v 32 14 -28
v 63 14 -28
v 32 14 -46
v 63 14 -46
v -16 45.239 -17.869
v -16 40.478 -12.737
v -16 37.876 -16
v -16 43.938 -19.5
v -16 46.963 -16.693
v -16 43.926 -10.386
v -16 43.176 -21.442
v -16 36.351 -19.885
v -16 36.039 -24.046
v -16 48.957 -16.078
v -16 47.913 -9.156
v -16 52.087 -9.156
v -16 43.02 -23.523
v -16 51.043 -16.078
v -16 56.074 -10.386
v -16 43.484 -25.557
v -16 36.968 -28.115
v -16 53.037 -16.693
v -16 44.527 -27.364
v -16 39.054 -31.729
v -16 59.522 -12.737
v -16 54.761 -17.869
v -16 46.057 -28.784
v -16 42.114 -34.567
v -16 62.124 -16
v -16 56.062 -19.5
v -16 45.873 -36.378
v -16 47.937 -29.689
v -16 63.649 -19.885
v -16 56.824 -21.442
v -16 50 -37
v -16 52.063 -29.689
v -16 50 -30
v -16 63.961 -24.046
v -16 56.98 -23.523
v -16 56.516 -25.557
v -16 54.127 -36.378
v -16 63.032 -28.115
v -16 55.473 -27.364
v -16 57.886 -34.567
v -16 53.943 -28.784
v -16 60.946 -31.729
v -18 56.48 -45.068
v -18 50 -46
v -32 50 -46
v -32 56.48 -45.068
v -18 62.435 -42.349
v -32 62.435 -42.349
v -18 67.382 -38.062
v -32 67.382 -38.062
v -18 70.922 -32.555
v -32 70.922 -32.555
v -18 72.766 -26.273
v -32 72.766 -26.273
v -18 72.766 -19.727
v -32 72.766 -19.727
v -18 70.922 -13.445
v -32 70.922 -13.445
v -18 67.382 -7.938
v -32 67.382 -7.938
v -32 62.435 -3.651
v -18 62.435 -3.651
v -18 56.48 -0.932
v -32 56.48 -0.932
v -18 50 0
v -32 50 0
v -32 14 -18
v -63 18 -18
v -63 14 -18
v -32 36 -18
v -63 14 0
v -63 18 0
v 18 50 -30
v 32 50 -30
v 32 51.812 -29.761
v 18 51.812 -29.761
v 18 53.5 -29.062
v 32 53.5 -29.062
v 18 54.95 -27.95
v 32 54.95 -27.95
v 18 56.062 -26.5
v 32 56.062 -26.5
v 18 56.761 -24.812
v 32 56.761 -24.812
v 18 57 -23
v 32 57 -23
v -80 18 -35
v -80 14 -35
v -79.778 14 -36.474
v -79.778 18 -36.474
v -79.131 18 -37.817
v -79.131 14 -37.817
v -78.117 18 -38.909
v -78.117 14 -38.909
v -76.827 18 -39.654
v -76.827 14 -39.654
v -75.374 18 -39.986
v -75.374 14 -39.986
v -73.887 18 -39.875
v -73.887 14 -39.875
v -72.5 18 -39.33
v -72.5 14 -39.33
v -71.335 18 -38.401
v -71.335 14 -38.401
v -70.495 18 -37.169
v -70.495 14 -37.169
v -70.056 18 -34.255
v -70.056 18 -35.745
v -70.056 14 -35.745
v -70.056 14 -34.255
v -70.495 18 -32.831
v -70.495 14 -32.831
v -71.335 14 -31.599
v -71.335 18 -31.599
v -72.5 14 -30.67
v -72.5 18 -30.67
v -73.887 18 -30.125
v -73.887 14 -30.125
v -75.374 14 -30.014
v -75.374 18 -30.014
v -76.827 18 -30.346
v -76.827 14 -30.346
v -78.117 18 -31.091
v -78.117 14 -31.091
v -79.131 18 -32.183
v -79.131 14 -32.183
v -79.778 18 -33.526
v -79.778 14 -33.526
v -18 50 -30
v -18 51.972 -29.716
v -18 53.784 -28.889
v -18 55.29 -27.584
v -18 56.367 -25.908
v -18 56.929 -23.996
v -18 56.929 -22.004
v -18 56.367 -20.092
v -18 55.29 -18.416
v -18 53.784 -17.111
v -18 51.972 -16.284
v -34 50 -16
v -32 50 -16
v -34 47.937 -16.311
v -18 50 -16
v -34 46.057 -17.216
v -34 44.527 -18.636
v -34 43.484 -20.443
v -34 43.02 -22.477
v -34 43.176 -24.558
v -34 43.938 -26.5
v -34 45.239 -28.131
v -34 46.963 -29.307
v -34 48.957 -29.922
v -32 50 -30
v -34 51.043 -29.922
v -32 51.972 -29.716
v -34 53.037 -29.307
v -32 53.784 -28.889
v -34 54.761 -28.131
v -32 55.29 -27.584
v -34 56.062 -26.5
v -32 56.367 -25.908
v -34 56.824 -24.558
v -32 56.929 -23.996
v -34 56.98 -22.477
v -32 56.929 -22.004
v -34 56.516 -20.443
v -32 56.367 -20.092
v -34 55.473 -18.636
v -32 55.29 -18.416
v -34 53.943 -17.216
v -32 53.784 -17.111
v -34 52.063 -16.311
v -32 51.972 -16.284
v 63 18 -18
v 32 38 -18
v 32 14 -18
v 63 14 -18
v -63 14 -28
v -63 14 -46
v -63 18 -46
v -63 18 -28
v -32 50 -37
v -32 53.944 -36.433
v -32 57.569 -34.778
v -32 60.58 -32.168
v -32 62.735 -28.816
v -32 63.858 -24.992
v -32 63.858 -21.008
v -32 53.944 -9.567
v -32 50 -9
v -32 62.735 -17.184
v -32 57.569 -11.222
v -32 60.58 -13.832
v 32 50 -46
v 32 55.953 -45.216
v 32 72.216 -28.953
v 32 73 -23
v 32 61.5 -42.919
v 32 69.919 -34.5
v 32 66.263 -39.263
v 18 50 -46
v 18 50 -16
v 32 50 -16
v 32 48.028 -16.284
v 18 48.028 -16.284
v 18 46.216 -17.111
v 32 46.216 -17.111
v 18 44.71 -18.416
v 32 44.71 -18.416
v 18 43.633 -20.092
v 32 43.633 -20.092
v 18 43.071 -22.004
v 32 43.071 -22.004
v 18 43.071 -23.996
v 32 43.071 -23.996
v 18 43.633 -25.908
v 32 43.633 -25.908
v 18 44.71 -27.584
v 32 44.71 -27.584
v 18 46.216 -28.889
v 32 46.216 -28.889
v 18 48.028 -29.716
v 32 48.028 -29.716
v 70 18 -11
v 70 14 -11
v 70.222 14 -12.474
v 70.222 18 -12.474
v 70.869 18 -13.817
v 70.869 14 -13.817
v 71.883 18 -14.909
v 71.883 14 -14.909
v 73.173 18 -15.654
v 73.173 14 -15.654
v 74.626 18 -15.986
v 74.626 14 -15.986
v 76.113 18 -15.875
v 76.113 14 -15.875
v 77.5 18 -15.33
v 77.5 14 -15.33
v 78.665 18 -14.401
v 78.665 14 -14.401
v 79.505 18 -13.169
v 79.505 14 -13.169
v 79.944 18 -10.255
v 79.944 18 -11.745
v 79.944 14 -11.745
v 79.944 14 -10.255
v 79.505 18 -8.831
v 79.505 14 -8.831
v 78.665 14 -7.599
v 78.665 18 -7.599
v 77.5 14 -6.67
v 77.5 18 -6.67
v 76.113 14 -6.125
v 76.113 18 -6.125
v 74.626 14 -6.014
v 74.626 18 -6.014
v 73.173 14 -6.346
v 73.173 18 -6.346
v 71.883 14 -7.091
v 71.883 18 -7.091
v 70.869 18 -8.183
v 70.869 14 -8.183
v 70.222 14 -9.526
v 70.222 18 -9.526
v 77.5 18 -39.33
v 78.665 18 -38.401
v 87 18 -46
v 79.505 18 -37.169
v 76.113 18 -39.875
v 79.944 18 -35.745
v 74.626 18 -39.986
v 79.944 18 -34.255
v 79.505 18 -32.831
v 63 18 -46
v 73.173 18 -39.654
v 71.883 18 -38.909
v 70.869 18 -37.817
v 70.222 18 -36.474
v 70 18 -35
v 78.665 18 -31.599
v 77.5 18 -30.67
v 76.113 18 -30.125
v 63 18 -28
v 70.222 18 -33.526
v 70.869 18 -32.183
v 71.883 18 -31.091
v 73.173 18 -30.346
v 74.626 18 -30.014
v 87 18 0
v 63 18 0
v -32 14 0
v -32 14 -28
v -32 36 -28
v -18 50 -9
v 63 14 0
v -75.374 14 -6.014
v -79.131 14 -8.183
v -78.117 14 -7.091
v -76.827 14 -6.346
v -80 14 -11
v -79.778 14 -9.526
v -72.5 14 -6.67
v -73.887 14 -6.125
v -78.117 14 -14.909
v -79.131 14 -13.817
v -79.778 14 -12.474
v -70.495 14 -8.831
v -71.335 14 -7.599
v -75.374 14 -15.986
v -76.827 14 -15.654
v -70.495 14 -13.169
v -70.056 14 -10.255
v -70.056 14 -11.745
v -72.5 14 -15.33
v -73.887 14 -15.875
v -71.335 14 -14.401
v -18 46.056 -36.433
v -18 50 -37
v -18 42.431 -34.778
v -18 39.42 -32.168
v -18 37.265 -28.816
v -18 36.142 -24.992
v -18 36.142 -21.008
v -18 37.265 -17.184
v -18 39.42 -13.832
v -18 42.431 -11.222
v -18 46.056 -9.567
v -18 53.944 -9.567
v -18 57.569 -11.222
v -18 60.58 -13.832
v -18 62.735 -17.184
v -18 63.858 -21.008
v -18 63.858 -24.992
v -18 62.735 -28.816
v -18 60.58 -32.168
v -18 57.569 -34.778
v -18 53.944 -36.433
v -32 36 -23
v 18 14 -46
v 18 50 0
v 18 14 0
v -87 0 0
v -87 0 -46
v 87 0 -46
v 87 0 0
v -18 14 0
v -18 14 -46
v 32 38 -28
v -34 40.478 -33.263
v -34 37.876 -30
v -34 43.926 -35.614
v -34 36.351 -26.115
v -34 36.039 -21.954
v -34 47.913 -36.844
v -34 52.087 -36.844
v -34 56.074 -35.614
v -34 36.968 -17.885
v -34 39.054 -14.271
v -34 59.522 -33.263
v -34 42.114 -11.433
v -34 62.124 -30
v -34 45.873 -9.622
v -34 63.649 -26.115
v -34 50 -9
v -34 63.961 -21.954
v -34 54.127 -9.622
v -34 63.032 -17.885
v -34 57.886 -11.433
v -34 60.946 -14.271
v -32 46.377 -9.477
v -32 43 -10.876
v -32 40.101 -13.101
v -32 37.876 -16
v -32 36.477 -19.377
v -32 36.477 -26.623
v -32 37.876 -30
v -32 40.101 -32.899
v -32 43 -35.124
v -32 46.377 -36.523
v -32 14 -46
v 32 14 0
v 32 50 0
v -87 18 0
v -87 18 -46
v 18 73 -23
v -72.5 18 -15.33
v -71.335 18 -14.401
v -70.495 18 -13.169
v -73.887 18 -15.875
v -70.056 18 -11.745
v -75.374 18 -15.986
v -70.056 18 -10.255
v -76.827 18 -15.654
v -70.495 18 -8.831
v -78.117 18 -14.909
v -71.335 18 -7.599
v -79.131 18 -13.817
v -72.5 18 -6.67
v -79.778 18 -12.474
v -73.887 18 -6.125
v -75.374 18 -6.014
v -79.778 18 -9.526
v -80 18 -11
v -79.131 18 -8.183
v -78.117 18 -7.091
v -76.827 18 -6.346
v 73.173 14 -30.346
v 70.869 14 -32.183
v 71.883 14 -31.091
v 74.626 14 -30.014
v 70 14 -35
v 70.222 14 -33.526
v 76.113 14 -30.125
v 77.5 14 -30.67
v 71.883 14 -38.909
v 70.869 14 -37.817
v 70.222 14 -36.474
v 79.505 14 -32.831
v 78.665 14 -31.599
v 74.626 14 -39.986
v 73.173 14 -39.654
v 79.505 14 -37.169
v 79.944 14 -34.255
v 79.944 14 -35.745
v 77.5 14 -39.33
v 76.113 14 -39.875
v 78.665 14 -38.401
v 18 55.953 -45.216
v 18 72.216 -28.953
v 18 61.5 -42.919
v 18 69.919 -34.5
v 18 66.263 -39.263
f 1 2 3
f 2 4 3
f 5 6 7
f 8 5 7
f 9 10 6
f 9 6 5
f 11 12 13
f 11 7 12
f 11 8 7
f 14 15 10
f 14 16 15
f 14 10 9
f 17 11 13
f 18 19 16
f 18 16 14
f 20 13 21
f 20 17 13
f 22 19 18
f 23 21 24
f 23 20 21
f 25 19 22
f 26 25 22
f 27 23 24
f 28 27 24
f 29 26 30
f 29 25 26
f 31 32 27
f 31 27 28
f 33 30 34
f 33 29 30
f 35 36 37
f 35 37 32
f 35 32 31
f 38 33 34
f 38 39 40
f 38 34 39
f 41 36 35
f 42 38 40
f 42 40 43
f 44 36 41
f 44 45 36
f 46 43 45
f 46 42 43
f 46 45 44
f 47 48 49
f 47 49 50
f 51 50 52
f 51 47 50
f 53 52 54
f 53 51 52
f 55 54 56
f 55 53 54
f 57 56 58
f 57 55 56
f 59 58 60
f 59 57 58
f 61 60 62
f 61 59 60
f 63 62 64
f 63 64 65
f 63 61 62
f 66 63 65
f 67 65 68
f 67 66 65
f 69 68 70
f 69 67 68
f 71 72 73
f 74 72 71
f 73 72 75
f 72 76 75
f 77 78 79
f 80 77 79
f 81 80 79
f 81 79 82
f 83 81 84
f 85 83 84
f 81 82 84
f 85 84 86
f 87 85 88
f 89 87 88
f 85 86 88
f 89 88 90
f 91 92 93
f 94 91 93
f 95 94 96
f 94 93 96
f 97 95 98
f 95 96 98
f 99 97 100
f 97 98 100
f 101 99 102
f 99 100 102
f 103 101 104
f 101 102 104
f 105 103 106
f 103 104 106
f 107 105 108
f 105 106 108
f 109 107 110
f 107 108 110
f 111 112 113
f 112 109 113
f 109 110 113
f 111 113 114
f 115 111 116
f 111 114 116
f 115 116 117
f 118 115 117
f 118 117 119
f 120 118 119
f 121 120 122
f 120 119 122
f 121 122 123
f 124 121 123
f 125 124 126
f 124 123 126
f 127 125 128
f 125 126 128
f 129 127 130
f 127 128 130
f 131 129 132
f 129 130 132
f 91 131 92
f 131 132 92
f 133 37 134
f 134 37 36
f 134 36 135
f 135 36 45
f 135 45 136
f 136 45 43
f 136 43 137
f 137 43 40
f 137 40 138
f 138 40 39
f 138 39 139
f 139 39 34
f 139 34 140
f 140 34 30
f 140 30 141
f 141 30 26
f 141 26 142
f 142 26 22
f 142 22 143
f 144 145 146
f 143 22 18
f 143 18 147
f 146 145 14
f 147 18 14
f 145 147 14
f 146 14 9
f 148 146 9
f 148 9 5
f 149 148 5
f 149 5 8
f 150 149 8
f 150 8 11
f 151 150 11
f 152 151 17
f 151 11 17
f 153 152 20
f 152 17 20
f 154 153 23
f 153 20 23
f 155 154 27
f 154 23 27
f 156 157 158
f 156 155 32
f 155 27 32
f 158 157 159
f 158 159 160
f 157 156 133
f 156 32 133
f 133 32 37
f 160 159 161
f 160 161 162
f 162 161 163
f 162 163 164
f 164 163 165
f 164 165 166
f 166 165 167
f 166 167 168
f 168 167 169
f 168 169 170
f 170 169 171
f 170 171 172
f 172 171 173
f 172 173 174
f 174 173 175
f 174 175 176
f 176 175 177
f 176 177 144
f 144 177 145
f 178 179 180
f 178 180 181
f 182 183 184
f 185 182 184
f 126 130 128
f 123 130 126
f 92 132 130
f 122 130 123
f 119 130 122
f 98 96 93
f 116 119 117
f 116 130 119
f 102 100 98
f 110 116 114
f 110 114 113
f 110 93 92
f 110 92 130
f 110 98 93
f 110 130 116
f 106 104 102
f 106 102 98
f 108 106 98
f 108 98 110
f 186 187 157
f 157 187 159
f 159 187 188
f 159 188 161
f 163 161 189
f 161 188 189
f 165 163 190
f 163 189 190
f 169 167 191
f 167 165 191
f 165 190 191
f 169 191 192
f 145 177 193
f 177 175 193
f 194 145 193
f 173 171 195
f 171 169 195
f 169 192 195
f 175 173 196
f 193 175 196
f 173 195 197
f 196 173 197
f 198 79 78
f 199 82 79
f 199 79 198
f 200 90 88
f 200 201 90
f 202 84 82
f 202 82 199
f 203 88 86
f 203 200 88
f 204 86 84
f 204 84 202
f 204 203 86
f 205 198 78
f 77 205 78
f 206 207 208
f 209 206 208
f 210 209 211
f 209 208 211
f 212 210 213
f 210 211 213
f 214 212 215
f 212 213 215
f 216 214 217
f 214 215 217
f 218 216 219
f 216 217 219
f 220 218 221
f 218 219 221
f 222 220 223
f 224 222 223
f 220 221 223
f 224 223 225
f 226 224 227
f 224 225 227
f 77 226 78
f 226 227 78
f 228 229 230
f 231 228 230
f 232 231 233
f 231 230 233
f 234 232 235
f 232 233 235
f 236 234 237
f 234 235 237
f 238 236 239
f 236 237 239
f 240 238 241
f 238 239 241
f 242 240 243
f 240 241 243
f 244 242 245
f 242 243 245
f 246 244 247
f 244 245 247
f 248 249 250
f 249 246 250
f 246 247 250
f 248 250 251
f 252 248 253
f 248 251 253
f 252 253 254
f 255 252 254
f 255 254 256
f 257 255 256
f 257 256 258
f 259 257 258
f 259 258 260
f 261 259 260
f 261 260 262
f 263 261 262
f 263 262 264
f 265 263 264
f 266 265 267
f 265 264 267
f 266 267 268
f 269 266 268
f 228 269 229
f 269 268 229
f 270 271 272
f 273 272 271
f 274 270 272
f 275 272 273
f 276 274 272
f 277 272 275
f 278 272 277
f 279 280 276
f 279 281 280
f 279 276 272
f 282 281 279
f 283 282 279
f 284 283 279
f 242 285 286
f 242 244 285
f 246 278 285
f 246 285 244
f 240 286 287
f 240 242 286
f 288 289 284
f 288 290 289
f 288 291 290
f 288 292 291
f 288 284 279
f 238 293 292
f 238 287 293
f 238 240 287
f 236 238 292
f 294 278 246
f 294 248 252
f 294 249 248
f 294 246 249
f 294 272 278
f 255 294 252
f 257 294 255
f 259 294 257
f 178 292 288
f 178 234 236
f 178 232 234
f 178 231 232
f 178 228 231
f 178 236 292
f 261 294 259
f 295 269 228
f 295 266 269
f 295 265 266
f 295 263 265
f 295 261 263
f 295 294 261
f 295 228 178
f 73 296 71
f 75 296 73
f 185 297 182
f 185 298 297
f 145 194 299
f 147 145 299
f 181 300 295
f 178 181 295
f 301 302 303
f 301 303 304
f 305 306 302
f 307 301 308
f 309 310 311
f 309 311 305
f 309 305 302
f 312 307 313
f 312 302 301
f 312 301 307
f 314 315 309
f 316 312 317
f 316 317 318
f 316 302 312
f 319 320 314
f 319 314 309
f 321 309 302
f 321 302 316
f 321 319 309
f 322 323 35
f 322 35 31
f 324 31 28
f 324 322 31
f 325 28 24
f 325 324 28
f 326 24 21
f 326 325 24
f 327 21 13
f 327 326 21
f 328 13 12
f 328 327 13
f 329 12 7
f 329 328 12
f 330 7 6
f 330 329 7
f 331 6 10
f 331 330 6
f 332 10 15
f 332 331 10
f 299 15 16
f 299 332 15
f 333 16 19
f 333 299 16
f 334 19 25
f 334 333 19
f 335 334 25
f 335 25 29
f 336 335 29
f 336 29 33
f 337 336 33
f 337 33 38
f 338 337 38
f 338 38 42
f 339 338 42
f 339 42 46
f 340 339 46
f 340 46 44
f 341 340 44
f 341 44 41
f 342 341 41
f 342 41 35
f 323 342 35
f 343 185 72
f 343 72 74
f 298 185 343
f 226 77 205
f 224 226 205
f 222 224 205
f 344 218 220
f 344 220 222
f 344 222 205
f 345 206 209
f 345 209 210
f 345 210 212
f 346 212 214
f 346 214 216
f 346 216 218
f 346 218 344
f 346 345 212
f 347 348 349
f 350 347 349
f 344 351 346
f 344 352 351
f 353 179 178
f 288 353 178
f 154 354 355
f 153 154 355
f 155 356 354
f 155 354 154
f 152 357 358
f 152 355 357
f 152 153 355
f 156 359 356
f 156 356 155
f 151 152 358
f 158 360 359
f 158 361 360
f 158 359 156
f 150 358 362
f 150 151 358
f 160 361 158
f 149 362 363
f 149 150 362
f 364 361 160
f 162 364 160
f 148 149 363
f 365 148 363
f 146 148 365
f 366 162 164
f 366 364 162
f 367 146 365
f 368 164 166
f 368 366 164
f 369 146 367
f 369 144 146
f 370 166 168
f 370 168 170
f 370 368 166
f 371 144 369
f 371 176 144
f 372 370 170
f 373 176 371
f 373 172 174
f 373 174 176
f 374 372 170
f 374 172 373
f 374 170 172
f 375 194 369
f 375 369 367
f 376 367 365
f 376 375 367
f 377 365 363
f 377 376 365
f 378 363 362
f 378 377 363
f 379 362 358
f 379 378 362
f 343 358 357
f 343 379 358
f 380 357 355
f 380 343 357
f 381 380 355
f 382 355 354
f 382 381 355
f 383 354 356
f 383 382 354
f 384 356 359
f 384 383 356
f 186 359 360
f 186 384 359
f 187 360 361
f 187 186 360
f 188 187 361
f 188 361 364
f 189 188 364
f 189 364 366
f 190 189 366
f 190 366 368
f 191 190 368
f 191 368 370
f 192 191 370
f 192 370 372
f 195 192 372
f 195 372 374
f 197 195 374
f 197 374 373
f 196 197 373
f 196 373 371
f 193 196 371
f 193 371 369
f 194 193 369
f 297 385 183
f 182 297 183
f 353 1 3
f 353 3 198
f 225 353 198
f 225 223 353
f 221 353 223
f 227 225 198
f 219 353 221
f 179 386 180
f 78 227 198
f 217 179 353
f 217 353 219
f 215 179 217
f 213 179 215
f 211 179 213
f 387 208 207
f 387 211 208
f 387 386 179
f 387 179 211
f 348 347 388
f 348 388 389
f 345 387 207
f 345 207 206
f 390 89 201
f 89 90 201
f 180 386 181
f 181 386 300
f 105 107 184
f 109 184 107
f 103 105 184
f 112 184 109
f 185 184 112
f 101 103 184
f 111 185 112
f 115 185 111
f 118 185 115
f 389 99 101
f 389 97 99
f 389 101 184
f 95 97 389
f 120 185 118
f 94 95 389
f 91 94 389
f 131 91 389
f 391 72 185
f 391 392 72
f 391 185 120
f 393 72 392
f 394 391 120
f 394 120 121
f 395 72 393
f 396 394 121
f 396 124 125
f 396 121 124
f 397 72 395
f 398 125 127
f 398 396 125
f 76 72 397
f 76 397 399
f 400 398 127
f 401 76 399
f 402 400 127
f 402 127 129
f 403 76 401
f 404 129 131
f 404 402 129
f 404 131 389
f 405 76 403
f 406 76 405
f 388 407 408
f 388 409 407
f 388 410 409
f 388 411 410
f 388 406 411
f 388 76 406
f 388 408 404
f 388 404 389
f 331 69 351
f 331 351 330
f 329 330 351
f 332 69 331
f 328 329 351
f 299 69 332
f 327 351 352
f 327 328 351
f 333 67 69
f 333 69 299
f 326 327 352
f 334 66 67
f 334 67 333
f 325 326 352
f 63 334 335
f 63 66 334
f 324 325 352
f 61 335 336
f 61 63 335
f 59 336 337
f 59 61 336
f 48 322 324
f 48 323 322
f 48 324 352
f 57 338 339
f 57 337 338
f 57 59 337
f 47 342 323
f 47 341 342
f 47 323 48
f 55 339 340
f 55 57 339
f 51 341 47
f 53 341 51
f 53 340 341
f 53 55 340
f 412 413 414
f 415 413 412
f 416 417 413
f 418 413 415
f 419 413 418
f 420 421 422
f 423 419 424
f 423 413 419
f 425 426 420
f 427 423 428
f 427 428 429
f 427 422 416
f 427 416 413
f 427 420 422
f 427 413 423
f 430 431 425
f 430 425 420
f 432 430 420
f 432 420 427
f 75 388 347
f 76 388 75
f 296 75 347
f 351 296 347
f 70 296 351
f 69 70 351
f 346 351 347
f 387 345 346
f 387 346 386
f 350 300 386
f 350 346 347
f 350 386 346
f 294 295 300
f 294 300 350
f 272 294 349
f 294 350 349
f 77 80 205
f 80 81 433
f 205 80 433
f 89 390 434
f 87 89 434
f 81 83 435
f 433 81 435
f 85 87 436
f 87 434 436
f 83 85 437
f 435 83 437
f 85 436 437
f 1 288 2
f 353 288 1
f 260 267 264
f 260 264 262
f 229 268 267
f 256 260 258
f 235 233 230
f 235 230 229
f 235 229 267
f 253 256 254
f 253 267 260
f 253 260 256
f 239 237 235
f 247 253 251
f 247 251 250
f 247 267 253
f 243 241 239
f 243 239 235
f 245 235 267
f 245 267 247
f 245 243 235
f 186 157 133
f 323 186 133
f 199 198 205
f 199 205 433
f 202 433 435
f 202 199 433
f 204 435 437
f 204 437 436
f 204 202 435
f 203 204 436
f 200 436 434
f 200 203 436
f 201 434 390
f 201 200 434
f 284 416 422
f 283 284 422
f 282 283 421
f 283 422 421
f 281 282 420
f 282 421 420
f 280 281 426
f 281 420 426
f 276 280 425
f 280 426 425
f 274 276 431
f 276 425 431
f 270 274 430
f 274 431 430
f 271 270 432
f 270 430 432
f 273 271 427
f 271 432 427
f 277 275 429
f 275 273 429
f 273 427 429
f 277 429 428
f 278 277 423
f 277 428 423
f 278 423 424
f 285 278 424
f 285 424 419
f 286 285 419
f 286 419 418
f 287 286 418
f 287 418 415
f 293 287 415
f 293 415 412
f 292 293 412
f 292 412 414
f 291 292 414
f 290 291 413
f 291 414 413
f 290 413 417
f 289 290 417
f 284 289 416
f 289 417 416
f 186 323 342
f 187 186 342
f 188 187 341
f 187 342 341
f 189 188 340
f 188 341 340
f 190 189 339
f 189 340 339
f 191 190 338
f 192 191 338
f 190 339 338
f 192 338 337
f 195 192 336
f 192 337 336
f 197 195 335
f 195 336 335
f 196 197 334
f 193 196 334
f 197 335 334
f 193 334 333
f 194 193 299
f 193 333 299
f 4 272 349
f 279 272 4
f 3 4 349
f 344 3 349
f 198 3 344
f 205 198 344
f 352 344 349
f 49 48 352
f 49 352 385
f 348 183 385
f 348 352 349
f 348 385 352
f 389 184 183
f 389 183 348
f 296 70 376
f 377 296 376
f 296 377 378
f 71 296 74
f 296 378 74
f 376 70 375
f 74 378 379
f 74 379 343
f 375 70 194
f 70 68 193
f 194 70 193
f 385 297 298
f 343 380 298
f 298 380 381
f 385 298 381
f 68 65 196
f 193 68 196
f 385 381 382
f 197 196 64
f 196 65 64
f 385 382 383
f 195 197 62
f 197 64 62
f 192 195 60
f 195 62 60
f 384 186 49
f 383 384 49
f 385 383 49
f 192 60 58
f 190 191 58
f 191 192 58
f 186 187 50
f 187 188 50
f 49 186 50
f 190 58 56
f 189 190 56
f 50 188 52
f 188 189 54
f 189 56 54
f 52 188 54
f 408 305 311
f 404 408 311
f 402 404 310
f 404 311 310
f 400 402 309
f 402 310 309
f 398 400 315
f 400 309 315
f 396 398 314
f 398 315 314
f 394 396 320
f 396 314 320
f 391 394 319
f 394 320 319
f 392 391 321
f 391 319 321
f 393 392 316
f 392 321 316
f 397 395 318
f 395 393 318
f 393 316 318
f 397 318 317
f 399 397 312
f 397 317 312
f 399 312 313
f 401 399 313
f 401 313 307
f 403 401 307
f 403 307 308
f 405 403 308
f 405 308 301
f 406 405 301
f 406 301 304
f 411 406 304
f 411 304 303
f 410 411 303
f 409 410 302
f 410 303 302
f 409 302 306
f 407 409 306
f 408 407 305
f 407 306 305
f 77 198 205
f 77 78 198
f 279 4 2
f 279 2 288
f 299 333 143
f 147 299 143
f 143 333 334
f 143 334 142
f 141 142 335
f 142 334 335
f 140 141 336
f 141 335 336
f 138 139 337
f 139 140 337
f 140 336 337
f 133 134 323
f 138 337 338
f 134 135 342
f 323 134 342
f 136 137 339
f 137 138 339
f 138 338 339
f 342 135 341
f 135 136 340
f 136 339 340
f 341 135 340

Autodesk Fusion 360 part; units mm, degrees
sketch "Sketch1" plane through (0, 0, 0) normal (0, 1, 0) x (1, 0, 0)
  line L0 (0, 0) -> (87, 0)
  line L1 (0, 0) -> (-87, 0)
  line L2 (-87, 0) -> (-87, 46)
  line L3 (87, 0) -> (87, 46)
  line L4 (-87, 46) -> (87, 46)
  dimension "d1" = 87
  dimension "d2" = 87
  dimension "d3" = 46
  dimension "d4" = 46
extrude "Extrude1" add sketch "Sketch1" along normal blind 14 makes body 1
sketch "Sketch2" plane through (0, 14, 0) normal (0, 1, 0) x (-1, 0, 0)
  line L0 (87, 0) -> (-87, 0)
  line L1 (-87, 0) -> (-87, -46)
  line L2 (-87, -46) -> (87, -46)
  line L3 (87, -46) -> (87, 0)
  line L4 (87, -46) -> (-87, -46)
  line L5 (-87, -46) -> (-87, 0)
  line L6 (-87, 0) -> (87, 0)
  line L7 (87, 0) -> (87, -46)
  line L8 (-87, -46) -> (-63, -46)
  line L9 (-63, -46) -> (-63, 0)
  line L10 (-63, 0) -> (-87, 0)
  line L11 (-87, 0) -> (-87, -46)
  line L12 (87, -46) -> (63, -46)
  line L13 (63, -46) -> (63, 0)
  line L14 (63, 0) -> (87, 0)
  line L15 (87, 0) -> (87, -46)
  line L16 (87, -46) -> (87, -23) construction
  line L17 (87, -23) -> (-87, -23) construction
  line L18 (87, -23) -> (87, -11) construction
  line L19 (87, -23) -> (87, -35) construction
  line L20 (87, -35) -> (-87, -35) construction
  line L21 (87, -11) -> (-87, -11) construction
  line L22 (87, -46) -> (75, -46) construction
  line L23 (75, -46) -> (75, 0) construction
  line L24 (-63, -46) -> (-75, -46) construction
  line L25 (-75, -46) -> (-75, 0) construction
  circle A0 centre (75, -35) radius 5
  circle A1 centre (75, -11) radius 5
  circle A2 centre (-75, -35) radius 5
  circle A3 centre (-75, -11) radius 5
  dimension "d7" = 24
  dimension "d8" = 24
  dimension "d9" = 46
  dimension "d10" = 12
  dimension "d11" = 12
  dimension "d12" = 10
  dimension "d13" = 10
  dimension "d14" = 10
  dimension "d15" = 10
extrude "Extrude2" add sketch "Sketch2" along normal blind 4 contours L0 L2 L3 L4 L6 L7 L12 L13 L14 L15 bodies 1
extrude "Extrude3" add sketch "Sketch2" along normal blind 4 contours L0 L1 L2 L4 L5 L6 L8 L9 L10 L11 bodies 1
sketch "Sketch3" plane through (0, 0, 0) normal (0, 0, 1) x (1, 0, 0)
  line L0 (-87, 0) -> (87, 0)
  line L1 (87, 0) -> (87, 18)
  line L2 (87, 18) -> (63, 18)
  line L3 (63, 18) -> (63, 14)
  line L4 (63, 14) -> (-63, 14)
  line L5 (-63, 14) -> (-63, 18)
  line L6 (-63, 18) -> (-87, 18)
  line L7 (-87, 18) -> (-87, 0)
  line L8 (0, 0) -> (-75, 0) construction
  line L9 (-75, 0) -> (-75, 18) construction
  line L10 (75, 18) -> (75, 0) construction
  line L11 (75, 0) -> (-75, 0) construction
  line L12 (87, 0) -> (32, 0) construction
  line L13 (0, 0) -> (75, 0) construction
  line L14 (32, 0) -> (32, 50) construction
  line L15 (32, 14) -> (32, 50)
  line L16 (32, 50) -> (18, 50)
  line L17 (18, 50) -> (18, 14)
  line L18 (32, 14) -> (-32, 14) construction
  line L19 (-32, 14) -> (-32, 50)
  line L20 (-32, 50) -> (-18, 50)
  line L21 (-18, 50) -> (-18, 14)
  dimension "d20" = 75
  dimension "d21" = 55
  dimension "d22" = 50
  dimension "d23" = 14
  dimension "d24" = 64
  dimension "d25" = 14
extrude "Extrude4" add sketch "Sketch3" against normal blind 46 contours L4 L15 L16 L17 bodies 1
extrude "Extrude5" add sketch "Sketch3" against normal blind 46 contours L4 L19 L20 L21 bodies 1
sketch "Sketch4" plane through (-18, 0, 0) normal (1, 0, 0) x (0, 0, -1)
  line L0 (0, 50) -> (0, 14)
  line L1 (0, 14) -> (46, 14)
  line L2 (46, 14) -> (46, 50)
  line L3 (46, 50) -> (0, 50)
  line L4 (0, 50) -> (0, 18)
  line L5 (0, 18) -> (46, 18)
  line L6 (46, 18) -> (46, 50)
  line L7 (46, 50) -> (0, 50)
  circle A0 centre (23, 50) radius 14
  circle A1 centre (23, 50) radius 7
  arc A2 (46, 50) -> (0, 50) centre (23, 50) ccw
  line L8 (0, 50) -> (0, 18)
  line L9 (0, 18) -> (46, 18)
  line L10 (46, 18) -> (46, 50)
  dimension "d30" = 28
  dimension "d31" = 14
extrude "Extrude6" add sketch "Sketch4" against normal blind 14 contours L3 L7 A0 A2 bodies 1
extrude "Extrude7" add sketch "Sketch4" along normal blind 2 separate body contours L3 L7 A0 A1 picked at (29.4096, 59.7107) makes body 2
extrude "Extrude8" add sketch "Sketch4" along normal blind 2 contours L3 L7 A0 A1 picked at (11.4115, 48.9567) bodies 1 2
sketch "Sketch5" plane through (-32, 0, 0) normal (-1, 0, 0) x (0, 0, 1)
  line L0 (-9, 50) -> (-37, 50)
  arc A0 (-9, 50) -> (-37, 50) centre (-23, 50) ccw
  arc A1 (0, 50) -> (-46, 50) centre (-23, 50) ccw
  line L1 (-46, 50) -> (-46, 14)
  line L2 (-46, 14) -> (0, 14)
  line L3 (0, 14) -> (0, 50)
  circle A2 centre (-23, 50) radius 14
  circle A3 centre (-23, 50) radius 7
  arc A4 (0, 50) -> (-46, 50) centre (-23, 50) ccw
  dimension "d38" = 46
  dimension "d39" = 28
  dimension "d40" = 14
extrude "Extrude9" add sketch "Sketch5" along normal blind 2 separate body contours L0 A2 A3 | L0 A0 A2 A3 makes body 3
sketch "Sketch6" plane through (32, 0, 0) normal (1, 0, 0) x (0, 0, -1)
  line L0 (0, 50) -> (0, 14)
  line L1 (0, 14) -> (46, 14)
  line L2 (46, 14) -> (46, 50)
  line L3 (46, 50) -> (0, 50)
  circle A0 centre (23, 50) radius 7
  line L4 (23, 57) -> (23, 73)
  line L5 (9, 50) -> (0, 50)
  line L6 (9, 50) -> (0, 50)
  arc A1 (46, 50) -> (0, 50) centre (23, 50) ccw
  dimension "d43" = 14
  dimension "d45" = 46
extrude "Extrude10" add sketch "Sketch6" against normal blind 14 separate body contours L3 A0 L4 A1 makes body 4
extrude "Extrude11" cut sketch "Sketch6" against normal blind 14 contours L3 A0 picked at (23.8525, 47.828) bodies 1
sketch "Sketch7" plane through (0, 0, 0) normal (0, 0, 1) x (1, 0, 0)
  line L0 (-87, 0) -> (87, 0)
  line L1 (87, 0) -> (87, 18)
  line L2 (87, 18) -> (63, 18)
  line L3 (63, 18) -> (63, 14)
  line L4 (63, 14) -> (32, 14)
  line L5 (32, 14) -> (32, 50)
  line L6 (32, 50) -> (18, 50)
  line L7 (18, 50) -> (18, 14)
  line L8 (18, 14) -> (-18, 14)
  line L9 (-18, 14) -> (-18, 50)
  line L10 (-18, 50) -> (-32, 50)
  line L11 (-32, 50) -> (-32, 14)
  line L12 (-32, 14) -> (-63, 14)
  line L13 (-63, 14) -> (-63, 18)
  line L14 (-63, 18) -> (-87, 18)
  line L15 (-87, 18) -> (-87, 0)
  line L16 (32, 50) -> (32, 38)
  line L17 (32, 38) -> (63, 18)
  line L18 (32, 38) -> (32, 14)
  line L19 (32, 14) -> (63, 14)
  line L20 (63, 14) -> (63, 10)
  line L21 (-32, 36) -> (-63, 18)
  line L22 (-63, 18) -> (-63, 14)
  line L23 (-63, 14) -> (-32, 14)
  line L24 (-32, 14) -> (-32, 36)
  dimension "d50" = 12
sketch "Sketch8" plane through (0, 0, -46) normal (0, 0, -1) x (-1, 0, 0)
  line L0 (-87, 0) -> (87, 0)
  line L1 (87, 0) -> (87, 18)
  line L2 (87, 18) -> (63, 18)
  line L3 (63, 18) -> (63, 14)
  line L4 (63, 14) -> (32, 14)
  line L5 (32, 14) -> (32, 50)
  line L6 (32, 50) -> (18, 50)
  line L7 (18, 50) -> (18, 14)
  line L8 (18, 14) -> (-18, 14)
  line L9 (-18, 14) -> (-18, 50)
  line L10 (-18, 50) -> (-32, 50)
  line L11 (-32, 50) -> (-32, 14)
  line L12 (-32, 14) -> (-63, 14)
  line L13 (-63, 14) -> (-63, 18)
  line L14 (-63, 18) -> (-87, 18)
  line L15 (-87, 18) -> (-87, 0)
  line L16 (-63, 18) -> (-32, 38)
  line L17 (-32, 38) -> (-32, 14)
  line L18 (-32, 14) -> (-63, 14)
  line L19 (63, 18) -> (32, 36)
  line L20 (32, 36) -> (32, 14)
  line L21 (32, 14) -> (63, 14)
  line L22 (63, 14) -> (63, 18)
extrude "Extrude12" add sketch "Sketch7" against normal blind 18 separate body contours L3 L4 L5 L17 L18 L19 makes body 5
extrude "Extrude13" add sketch "Sketch8" against normal blind 18 separate body contours L11 L12 L13 L16 L17 L18 makes body 6
extrude "Extrude14" add 1 faces at (42.3333, 23.3333, -18) along direction (0, 0, -1) blind 10 on bodies 5 bodies 1 3 4 5 6
sketch "Sketch9" plane through (0, 0, 0) normal (0, 0, 1) x (1, 0, 0)
  line L0 (-87, 0) -> (87, 0)
  line L1 (87, 0) -> (87, 18)
  line L2 (87, 18) -> (63, 18)
  line L3 (63, 18) -> (32, 38)
  line L4 (32, 38) -> (32, 50)
  line L5 (32, 50) -> (18, 50)
  line L6 (18, 50) -> (18, 14)
  line L7 (18, 14) -> (-18, 14)
  line L8 (-18, 14) -> (-18, 50)
  line L9 (-18, 50) -> (-32, 50)
  line L10 (-32, 50) -> (-32, 14)
  line L11 (-32, 14) -> (-63, 14)
  line L12 (-63, 14) -> (-63, 18)
  line L13 (-63, 18) -> (-87, 18)
  line L14 (-87, 18) -> (-87, 0)
  line L15 (32, 38) -> (32, 14)
  line L16 (32, 14) -> (63, 14)
  line L17 (63, 14) -> (63, 18)
extrude "Extrude15" cut sketch "Sketch9" against normal blind 18 contours L3 L15 L16 L17 bodies 1
sketch "Sketch10" plane through (0, 0, -46) normal (0, 0, -1) x (-1, 0, 0)
  line L0 (-87, 0) -> (87, 0)
  line L1 (87, 0) -> (87, 18)
  line L2 (87, 18) -> (63, 18)
  line L3 (63, 18) -> (63, 14)
  line L4 (63, 14) -> (32, 14)
  line L5 (32, 14) -> (32, 50)
  line L6 (32, 50) -> (18, 50)
  line L7 (18, 50) -> (18, 14)
  line L8 (18, 14) -> (-18, 14)
  line L9 (-18, 14) -> (-18, 50)
  line L10 (-18, 50) -> (-32, 50)
  line L11 (-32, 50) -> (-32, 38)
  line L12 (-32, 38) -> (-63, 18)
  line L13 (-63, 18) -> (-87, 18)
  line L14 (-87, 18) -> (-87, 0)
  line L15 (-63, 14) -> (-63, 18)
  line L16 (-63, 14) -> (-32, 14)
  line L17 (-32, 14) -> (-32, 39)
  line L18 (-63, 18) -> (-32, 38)
extrude "Extrude16" cut sketch "Sketch10" against normal blind 18 contours L12 L15 L16 L17 L18 bodies 1
sketch "Sketch11" plane through (0, 0, 0) normal (0, 0, 1) x (1, 0, 0)
  line L0 (32, 14) -> (32, 50)
  line L1 (32, 50) -> (18, 50)
  line L2 (18, 50) -> (18, 14)
  line L3 (18, 14) -> (-18, 14)
  line L4 (-18, 14) -> (-18, 50)
  line L5 (-18, 50) -> (-32, 50)
  line L6 (-32, 50) -> (-32, 14)
  line L7 (-32, 14) -> (-63, 14)
  line L8 (-63, 14) -> (-63, 18)
  line L9 (-63, 18) -> (-87, 18)
  line L10 (-87, 18) -> (-87, 0)
  line L11 (-87, 0) -> (87, 0)
  line L12 (87, 0) -> (87, 18)
  line L13 (87, 18) -> (63, 18)
  line L14 (63, 18) -> (63, 14)
  line L15 (63, 14) -> (32, 14)
  line L16 (-63, 18) -> (-32, 36)
  line L17 (-32, 36) -> (-32, 14)
  line L18 (-32, 14) -> (-63, 14)
  line L19 (-63, 14) -> (-63, 18)
sketch "Sketch12" plane through (0, 0, -46) normal (0, 0, -1) x (-1, 0, 0)
  line L0 (-63, 14) -> (-63, 18)
  line L1 (-63, 18) -> (-87, 18)
  line L2 (-87, 18) -> (-87, 0)
  line L3 (-87, 0) -> (87, 0)
  line L4 (87, 0) -> (87, 18)
  line L5 (87, 18) -> (63, 18)
  line L6 (63, 18) -> (63, 14)
  line L7 (63, 14) -> (32, 14)
  line L8 (32, 14) -> (32, 50)
  line L9 (32, 50) -> (18, 50)
  line L10 (18, 50) -> (18, 14)
  line L11 (18, 14) -> (-18, 14)
  line L12 (-18, 14) -> (-18, 50)
  line L13 (-18, 50) -> (-32, 50)
  line L14 (-32, 50) -> (-32, 14)
  line L15 (-32, 14) -> (-63, 14)
  line L16 (32, 36) -> (32, 14)
  line L17 (32, 14) -> (63, 14)
  line L18 (63, 18) -> (32, 36)
extrude "Extrude17" add sketch "Sketch12" against normal blind 18 separate body contours L6 L7 L8 L16 L17 L18 makes body 7
extrude "Extrude18" add sketch "Sketch11" against normal blind 18 separate body contours L6 L7 L8 L16 L17 L18 L19 makes body 8
extrude "Extrude19" add 1 faces at (-42.3333, 22.6667, -28) along direction (0, 0, 1) blind 10 on bodies 7 bodies 1 4 7 3 8
sketch "Sketch13" plane through (0, 0, 0) normal (0, 0, 1) x (1, 0, 0)
  line L0 (32, 14) -> (32, 50)
  line L1 (32, 50) -> (18, 50)
  line L2 (18, 50) -> (18, 14)
  line L3 (18, 14) -> (-18, 14)
  line L4 (-18, 14) -> (-18, 50)
  line L5 (-18, 50) -> (-32, 50)
  line L6 (-32, 50) -> (-32, 36)
  line L7 (-32, 36) -> (-63, 18)
  line L8 (-63, 18) -> (-87, 18)
  line L9 (-87, 18) -> (-87, 0)
  line L10 (-87, 0) -> (87, 0)
  line L11 (87, 0) -> (87, 18)
  line L12 (87, 18) -> (63, 18)
  line L13 (63, 18) -> (63, 14)
  line L14 (63, 14) -> (32, 14)
  line L15 (-63, 18) -> (-63, 14)
  line L16 (-32, 36) -> (-32, 14)
  line L17 (-32, 14) -> (-63, 14)
  line L18 (-63, 18) -> (-32, 36)
  dimension "d67" = 4
sketch "Sketch14" plane through (0, 0, -46) normal (0, 0, -1) x (-1, 0, 0)
  line L0 (-63, 14) -> (-63, 18)
  line L1 (-63, 18) -> (-87, 18)
  line L2 (-87, 18) -> (-87, 0)
  line L3 (-87, 0) -> (87, 0)
  line L4 (87, 0) -> (87, 18)
  line L5 (87, 18) -> (63, 18)
  line L6 (63, 18) -> (32, 36)
  line L7 (32, 36) -> (32, 50)
  line L8 (32, 50) -> (18, 50)
  line L9 (18, 50) -> (18, 14)
  line L10 (18, 14) -> (-18, 14)
  line L11 (-18, 14) -> (-18, 50)
  line L12 (-18, 50) -> (-32, 50)
  line L13 (-32, 50) -> (-32, 14)
  line L14 (-32, 14) -> (-63, 14)
  line L15 (32, 36) -> (32, 14)
  line L16 (32, 14) -> (63, 14)
  line L17 (63, 14) -> (63, 18)
extrude "Extrude20" cut sketch "Sketch13" against normal blind 18 contours L7 L15 L16 L17 L18 bodies 1
extrude "Extrude21" cut sketch "Sketch14" against normal blind 18 contours L6 L15 L16 L17 bodies 1
extrude "Extrude22" cut 1 faces at (-18, 48.6398, -20.8717) along direction (-1, 0, 0) blind 12 on bodies 1 bodies 1
extrude "Extrude23" cut 1 faces at (-32, 45.8931, -21.5507) along direction (1, 0, 0) blind 435 on bodies 1 bodies 1
